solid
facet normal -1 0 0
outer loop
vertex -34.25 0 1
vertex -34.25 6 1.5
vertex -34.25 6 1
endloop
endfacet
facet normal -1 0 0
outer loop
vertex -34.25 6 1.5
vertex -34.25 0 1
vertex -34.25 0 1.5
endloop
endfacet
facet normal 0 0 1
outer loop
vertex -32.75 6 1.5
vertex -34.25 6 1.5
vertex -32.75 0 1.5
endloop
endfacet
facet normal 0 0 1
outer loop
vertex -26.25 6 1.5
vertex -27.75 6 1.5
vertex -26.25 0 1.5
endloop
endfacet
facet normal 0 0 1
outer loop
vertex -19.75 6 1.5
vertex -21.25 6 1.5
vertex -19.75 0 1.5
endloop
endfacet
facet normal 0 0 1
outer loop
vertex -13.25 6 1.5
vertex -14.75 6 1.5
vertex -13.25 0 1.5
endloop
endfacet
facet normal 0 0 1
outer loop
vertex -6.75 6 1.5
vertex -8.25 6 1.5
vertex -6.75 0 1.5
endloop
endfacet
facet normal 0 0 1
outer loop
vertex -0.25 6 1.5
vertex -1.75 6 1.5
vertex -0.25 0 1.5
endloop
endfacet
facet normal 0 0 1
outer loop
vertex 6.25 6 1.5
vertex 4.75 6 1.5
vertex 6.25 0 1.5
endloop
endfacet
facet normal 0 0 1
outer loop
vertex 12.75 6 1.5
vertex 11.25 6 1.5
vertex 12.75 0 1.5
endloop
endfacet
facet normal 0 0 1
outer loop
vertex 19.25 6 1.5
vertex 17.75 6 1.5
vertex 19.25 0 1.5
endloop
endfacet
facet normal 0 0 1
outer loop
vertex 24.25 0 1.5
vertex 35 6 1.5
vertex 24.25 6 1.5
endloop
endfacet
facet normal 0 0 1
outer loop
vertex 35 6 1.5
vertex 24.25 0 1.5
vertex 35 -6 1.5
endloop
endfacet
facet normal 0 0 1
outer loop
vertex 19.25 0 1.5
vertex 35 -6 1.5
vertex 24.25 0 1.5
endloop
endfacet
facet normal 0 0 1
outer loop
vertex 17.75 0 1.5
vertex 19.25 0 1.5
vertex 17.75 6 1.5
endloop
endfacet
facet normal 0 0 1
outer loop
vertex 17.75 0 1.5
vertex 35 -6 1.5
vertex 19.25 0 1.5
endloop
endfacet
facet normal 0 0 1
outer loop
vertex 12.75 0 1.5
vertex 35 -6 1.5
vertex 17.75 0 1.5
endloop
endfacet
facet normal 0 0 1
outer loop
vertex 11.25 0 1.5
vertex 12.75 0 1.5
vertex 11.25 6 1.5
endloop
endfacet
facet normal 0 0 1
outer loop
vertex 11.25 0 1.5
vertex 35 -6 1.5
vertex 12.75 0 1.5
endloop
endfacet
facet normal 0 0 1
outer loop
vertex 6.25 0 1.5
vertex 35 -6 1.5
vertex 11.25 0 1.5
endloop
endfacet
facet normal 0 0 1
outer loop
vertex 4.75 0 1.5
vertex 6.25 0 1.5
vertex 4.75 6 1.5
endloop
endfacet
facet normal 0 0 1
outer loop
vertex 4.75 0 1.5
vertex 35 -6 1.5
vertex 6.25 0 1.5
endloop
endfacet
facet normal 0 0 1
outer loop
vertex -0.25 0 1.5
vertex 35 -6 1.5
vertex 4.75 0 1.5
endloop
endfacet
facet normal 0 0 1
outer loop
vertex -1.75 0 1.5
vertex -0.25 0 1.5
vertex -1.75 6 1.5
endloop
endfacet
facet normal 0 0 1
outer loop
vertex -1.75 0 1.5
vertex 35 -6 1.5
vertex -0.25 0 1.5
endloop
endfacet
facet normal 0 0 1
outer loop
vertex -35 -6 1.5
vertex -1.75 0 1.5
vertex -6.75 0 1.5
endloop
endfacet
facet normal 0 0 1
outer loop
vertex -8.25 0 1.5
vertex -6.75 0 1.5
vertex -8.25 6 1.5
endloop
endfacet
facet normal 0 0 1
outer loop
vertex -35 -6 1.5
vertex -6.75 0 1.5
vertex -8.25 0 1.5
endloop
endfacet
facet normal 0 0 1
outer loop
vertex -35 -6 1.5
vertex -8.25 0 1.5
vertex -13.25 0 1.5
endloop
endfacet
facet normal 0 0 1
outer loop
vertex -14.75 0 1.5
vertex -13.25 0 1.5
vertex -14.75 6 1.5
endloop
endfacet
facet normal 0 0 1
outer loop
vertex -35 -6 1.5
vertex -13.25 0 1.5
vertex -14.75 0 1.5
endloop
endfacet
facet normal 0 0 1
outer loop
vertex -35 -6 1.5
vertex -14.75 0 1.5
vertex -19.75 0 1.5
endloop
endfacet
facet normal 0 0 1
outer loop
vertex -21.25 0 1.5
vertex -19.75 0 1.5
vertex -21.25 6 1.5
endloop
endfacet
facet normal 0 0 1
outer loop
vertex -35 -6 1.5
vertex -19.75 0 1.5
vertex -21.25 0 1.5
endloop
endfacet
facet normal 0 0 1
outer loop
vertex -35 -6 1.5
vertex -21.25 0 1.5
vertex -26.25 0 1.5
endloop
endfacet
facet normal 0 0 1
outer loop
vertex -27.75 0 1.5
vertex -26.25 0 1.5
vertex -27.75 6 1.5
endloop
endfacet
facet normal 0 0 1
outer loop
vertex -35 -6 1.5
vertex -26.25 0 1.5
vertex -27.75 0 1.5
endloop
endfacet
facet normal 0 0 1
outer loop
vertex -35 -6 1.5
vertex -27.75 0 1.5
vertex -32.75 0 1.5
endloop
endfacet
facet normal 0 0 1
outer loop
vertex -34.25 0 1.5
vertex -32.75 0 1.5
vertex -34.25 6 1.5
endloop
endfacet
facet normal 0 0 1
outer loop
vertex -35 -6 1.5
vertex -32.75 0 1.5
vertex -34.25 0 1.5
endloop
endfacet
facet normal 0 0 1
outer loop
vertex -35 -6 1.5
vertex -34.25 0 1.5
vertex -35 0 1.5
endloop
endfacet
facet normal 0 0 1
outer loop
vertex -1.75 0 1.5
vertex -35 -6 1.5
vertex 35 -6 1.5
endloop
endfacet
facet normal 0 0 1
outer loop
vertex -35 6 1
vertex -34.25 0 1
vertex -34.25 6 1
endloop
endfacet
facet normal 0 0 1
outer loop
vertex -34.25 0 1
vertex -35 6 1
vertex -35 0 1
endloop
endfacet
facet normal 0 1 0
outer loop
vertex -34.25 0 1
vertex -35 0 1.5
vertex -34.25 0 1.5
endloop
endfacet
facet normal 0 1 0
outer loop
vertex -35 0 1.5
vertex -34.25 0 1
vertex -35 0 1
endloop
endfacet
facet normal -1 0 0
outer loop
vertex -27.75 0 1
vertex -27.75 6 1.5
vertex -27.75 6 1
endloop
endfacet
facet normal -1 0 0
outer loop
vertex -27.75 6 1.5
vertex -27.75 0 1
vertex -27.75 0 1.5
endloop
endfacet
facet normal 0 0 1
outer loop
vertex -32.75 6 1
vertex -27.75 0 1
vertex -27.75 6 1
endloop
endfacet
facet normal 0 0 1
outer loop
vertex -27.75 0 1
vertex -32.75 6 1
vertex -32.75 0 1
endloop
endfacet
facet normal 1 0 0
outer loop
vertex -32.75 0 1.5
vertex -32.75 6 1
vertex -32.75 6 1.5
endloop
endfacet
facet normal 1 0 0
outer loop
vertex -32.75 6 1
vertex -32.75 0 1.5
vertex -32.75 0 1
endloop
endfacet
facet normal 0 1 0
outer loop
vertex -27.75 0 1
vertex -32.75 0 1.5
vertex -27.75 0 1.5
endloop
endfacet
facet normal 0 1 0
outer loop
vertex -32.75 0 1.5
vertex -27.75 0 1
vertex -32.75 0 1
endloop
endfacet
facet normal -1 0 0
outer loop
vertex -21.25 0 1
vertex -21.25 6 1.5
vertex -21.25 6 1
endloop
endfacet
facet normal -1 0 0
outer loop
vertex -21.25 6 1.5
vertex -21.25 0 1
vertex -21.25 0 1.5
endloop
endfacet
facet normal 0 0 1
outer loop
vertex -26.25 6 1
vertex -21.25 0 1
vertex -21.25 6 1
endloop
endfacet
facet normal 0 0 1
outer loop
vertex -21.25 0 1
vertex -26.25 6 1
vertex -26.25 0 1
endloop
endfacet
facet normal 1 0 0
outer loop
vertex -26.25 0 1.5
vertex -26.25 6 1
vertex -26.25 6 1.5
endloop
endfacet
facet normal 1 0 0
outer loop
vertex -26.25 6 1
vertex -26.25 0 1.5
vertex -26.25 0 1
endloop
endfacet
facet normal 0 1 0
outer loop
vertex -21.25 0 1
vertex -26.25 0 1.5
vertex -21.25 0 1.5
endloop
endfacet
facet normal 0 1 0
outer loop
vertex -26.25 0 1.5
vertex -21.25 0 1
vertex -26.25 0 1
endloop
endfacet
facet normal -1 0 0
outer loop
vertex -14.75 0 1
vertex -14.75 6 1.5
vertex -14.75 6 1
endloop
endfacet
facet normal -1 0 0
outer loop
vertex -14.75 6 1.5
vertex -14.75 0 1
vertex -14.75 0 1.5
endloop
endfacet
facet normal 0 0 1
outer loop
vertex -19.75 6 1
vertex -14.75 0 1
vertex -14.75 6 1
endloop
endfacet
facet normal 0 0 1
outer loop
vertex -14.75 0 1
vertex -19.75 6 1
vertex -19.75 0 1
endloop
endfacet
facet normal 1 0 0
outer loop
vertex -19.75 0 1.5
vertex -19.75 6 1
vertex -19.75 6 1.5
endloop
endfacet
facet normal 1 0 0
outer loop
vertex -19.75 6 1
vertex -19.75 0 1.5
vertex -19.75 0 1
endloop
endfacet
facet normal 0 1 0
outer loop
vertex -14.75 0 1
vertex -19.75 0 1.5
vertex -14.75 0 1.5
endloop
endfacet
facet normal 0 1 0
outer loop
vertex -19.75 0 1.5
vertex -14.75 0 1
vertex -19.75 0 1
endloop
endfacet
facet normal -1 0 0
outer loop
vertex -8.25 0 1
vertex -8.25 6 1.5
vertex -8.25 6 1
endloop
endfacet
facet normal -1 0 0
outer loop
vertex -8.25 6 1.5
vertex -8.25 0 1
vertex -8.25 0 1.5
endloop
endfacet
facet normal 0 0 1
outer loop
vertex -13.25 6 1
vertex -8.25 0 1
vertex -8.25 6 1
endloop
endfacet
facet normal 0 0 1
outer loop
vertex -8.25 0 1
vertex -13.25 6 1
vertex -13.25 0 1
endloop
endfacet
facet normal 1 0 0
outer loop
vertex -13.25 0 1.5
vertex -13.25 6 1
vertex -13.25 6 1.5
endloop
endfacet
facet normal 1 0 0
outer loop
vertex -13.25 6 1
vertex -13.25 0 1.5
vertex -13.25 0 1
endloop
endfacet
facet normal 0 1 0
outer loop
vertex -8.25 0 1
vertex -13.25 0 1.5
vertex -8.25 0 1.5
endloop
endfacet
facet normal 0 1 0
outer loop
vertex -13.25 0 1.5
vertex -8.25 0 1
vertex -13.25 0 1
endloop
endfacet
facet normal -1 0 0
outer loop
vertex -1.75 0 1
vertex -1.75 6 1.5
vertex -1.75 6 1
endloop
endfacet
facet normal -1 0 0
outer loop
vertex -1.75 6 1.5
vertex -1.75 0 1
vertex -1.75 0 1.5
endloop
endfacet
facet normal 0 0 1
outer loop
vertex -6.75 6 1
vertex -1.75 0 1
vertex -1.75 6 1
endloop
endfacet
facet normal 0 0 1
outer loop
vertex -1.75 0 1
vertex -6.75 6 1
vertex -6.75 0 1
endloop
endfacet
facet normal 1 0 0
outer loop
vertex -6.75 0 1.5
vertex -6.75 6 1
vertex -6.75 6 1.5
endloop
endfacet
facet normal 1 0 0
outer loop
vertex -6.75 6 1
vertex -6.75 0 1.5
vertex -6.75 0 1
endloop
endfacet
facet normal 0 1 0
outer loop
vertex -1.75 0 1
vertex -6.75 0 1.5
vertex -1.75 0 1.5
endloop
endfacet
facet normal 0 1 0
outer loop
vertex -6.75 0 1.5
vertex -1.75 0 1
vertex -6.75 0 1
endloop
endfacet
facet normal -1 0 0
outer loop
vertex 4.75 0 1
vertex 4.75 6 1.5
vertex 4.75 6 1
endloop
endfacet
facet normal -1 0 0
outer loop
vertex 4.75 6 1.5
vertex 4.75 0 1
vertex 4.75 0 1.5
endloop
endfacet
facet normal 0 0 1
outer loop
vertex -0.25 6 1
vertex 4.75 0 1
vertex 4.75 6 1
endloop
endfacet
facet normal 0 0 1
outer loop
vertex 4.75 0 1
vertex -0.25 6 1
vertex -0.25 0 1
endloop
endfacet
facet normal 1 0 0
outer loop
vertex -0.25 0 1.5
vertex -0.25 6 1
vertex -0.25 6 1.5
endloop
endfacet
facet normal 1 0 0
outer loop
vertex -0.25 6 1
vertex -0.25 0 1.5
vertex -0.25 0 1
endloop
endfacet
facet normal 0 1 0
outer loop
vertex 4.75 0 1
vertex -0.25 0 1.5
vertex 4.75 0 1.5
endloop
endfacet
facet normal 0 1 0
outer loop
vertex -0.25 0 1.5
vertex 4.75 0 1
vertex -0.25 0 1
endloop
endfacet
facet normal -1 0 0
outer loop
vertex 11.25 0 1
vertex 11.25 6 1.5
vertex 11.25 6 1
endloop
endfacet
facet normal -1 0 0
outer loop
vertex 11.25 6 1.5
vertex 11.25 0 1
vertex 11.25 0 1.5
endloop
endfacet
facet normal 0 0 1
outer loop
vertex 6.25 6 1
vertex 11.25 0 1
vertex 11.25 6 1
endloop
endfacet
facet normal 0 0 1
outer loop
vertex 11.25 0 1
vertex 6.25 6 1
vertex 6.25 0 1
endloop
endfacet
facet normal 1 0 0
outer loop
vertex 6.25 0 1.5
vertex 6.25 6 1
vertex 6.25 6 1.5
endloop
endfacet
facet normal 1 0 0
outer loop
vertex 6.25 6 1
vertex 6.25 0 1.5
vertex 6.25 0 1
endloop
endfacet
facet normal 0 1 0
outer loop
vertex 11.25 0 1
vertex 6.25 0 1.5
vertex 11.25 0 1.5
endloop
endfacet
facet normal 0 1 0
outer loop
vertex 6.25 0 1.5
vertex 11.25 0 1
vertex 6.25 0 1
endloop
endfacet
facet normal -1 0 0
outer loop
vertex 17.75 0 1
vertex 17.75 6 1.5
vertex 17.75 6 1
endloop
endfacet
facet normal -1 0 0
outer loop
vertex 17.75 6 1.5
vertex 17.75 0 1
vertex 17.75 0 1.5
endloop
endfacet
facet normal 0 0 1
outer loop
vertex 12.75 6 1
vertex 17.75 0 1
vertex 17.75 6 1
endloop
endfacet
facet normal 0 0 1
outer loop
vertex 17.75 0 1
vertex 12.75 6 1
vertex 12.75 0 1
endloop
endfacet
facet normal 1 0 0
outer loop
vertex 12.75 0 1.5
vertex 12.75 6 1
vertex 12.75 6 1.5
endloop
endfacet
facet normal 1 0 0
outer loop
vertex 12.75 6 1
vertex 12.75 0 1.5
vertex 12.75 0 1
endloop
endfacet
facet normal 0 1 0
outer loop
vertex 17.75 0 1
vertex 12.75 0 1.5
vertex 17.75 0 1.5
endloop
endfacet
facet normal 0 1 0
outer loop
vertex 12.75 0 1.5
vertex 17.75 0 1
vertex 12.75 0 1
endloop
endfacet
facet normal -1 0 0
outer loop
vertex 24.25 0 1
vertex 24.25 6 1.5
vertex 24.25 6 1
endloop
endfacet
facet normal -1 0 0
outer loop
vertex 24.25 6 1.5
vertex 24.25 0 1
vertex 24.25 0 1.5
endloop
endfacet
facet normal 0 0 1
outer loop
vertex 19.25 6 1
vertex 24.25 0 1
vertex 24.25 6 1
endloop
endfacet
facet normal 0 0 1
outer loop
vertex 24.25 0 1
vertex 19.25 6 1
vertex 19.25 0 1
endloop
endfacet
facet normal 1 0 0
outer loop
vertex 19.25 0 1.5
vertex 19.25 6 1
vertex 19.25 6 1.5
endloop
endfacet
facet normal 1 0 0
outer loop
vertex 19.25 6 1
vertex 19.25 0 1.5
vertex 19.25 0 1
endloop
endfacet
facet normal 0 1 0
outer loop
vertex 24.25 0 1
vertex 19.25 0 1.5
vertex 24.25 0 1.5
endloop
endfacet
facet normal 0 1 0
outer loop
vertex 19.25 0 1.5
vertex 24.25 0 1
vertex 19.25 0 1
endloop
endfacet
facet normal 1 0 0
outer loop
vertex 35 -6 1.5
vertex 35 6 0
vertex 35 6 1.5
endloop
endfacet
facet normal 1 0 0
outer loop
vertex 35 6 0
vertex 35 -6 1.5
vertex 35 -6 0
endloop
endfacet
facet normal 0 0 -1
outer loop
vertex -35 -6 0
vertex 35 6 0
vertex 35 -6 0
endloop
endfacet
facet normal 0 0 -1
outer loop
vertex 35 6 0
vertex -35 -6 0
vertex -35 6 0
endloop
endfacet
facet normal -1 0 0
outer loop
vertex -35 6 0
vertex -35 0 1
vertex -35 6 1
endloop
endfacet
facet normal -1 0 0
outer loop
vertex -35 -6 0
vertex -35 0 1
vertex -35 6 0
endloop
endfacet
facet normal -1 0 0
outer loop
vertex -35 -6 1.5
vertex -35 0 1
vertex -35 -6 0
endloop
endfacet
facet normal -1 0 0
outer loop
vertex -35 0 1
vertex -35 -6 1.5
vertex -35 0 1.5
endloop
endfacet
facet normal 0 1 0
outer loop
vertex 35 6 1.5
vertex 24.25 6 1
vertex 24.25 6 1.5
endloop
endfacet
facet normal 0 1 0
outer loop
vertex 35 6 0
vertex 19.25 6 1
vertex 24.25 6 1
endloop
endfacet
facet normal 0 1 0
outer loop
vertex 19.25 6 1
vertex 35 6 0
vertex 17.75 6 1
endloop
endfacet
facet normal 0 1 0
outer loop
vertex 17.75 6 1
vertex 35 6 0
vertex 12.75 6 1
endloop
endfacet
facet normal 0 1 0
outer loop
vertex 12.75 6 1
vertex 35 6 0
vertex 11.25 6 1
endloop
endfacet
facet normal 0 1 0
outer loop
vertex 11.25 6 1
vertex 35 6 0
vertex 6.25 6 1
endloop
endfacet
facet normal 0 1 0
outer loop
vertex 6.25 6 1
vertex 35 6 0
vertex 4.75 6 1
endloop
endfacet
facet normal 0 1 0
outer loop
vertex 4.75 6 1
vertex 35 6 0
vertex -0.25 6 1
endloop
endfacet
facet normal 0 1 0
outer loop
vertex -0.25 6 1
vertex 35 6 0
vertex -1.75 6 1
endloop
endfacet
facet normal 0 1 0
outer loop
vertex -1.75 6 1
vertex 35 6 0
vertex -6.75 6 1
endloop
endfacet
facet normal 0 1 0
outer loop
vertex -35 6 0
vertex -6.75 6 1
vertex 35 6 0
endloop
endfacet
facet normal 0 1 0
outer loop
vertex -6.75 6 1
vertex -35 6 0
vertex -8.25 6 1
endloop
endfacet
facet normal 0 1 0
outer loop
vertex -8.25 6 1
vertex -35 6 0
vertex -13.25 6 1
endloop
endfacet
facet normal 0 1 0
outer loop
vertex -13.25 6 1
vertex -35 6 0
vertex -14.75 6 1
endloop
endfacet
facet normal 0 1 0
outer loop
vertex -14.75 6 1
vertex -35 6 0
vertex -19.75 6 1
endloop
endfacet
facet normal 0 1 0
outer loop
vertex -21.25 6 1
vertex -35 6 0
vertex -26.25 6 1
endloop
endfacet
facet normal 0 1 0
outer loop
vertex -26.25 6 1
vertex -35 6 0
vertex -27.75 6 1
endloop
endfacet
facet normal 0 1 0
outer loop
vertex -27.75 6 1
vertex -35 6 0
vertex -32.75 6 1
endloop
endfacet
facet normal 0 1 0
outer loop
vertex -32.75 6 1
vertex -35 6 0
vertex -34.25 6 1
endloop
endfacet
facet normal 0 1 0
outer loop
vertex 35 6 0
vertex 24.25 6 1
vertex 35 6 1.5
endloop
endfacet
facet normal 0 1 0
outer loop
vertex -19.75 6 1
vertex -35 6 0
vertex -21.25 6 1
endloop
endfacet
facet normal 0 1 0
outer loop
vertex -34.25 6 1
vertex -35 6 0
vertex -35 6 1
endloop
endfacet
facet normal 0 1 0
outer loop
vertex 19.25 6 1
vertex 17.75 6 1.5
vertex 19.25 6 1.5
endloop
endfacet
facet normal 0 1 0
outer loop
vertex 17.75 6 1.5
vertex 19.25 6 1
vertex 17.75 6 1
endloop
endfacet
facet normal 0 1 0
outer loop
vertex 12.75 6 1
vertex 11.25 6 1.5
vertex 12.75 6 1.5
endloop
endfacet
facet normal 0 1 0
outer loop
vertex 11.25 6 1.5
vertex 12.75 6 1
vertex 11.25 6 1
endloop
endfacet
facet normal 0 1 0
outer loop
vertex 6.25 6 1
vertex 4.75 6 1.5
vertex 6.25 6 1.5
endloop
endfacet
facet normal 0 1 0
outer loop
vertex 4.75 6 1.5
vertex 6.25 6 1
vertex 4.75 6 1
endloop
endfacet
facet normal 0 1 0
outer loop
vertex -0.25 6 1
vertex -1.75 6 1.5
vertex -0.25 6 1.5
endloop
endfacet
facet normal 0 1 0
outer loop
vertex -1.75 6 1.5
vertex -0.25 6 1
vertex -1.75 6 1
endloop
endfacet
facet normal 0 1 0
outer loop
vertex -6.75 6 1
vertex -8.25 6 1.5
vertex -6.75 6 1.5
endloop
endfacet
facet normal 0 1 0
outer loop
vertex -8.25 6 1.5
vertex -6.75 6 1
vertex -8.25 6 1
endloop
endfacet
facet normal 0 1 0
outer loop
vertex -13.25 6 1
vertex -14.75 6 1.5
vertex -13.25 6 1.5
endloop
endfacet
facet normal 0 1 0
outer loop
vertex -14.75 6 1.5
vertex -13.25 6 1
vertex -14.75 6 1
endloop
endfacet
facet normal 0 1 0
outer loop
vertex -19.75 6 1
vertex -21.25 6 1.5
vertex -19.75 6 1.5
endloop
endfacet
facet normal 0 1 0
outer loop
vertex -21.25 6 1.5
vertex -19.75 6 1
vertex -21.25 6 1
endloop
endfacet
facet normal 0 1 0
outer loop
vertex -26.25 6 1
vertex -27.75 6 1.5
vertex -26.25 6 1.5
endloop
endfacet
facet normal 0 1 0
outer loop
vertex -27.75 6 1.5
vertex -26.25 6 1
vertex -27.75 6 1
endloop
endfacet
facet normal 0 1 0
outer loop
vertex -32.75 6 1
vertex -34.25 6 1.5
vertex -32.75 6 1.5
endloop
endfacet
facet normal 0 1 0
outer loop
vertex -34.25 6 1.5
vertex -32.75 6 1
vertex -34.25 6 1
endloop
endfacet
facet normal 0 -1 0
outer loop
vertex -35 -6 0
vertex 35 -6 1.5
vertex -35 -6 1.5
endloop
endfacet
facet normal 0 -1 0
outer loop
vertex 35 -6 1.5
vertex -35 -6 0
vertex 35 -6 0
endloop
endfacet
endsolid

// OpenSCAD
// 10-well comb for agarose gel casting, printed lying flat
// Units: mm

// ---- Spine (back bar) ----
spine_len   = 70;    // spine length along X
spine_wid   = 12;    // spine width along Y
plate_thk   = 1.5;   // plate thickness along Z

// ---- Teeth ----
tooth_count = 10;    // number of wells
tooth_w     = 5.0;   // tooth width along X
tooth_len   = 12;    // tooth length along Y (from top edge of spine)
gap         = 1.5;   // gap between neighbouring teeth along X

// ---- Derived ----
pitch       = tooth_w + gap;              // centre-to-centre spacing
row_span    = (tooth_count - 1) * gap;    // total gap width
x_start     = -spine_len/2 + tooth_w/2 - row_span/2; // first tooth centre X

// ---- Modelling ----
eps         = 0.5;   // cutter overshoot past faces
$fn         = 64;

difference() {
    // Base plate
    translate([-spine_len/2, -spine_wid/2, 0])
        cube([spine_len, spine_wid, plate_thk]);

    // Teeth cut from the top edge, hanging in -Y
    for (i = [0 : tooth_count - 1]) {
        translate([x_start + i * pitch, 0, plate_thk - eps])
            cube([tooth_w, tooth_len + eps, eps]);
    }
}
